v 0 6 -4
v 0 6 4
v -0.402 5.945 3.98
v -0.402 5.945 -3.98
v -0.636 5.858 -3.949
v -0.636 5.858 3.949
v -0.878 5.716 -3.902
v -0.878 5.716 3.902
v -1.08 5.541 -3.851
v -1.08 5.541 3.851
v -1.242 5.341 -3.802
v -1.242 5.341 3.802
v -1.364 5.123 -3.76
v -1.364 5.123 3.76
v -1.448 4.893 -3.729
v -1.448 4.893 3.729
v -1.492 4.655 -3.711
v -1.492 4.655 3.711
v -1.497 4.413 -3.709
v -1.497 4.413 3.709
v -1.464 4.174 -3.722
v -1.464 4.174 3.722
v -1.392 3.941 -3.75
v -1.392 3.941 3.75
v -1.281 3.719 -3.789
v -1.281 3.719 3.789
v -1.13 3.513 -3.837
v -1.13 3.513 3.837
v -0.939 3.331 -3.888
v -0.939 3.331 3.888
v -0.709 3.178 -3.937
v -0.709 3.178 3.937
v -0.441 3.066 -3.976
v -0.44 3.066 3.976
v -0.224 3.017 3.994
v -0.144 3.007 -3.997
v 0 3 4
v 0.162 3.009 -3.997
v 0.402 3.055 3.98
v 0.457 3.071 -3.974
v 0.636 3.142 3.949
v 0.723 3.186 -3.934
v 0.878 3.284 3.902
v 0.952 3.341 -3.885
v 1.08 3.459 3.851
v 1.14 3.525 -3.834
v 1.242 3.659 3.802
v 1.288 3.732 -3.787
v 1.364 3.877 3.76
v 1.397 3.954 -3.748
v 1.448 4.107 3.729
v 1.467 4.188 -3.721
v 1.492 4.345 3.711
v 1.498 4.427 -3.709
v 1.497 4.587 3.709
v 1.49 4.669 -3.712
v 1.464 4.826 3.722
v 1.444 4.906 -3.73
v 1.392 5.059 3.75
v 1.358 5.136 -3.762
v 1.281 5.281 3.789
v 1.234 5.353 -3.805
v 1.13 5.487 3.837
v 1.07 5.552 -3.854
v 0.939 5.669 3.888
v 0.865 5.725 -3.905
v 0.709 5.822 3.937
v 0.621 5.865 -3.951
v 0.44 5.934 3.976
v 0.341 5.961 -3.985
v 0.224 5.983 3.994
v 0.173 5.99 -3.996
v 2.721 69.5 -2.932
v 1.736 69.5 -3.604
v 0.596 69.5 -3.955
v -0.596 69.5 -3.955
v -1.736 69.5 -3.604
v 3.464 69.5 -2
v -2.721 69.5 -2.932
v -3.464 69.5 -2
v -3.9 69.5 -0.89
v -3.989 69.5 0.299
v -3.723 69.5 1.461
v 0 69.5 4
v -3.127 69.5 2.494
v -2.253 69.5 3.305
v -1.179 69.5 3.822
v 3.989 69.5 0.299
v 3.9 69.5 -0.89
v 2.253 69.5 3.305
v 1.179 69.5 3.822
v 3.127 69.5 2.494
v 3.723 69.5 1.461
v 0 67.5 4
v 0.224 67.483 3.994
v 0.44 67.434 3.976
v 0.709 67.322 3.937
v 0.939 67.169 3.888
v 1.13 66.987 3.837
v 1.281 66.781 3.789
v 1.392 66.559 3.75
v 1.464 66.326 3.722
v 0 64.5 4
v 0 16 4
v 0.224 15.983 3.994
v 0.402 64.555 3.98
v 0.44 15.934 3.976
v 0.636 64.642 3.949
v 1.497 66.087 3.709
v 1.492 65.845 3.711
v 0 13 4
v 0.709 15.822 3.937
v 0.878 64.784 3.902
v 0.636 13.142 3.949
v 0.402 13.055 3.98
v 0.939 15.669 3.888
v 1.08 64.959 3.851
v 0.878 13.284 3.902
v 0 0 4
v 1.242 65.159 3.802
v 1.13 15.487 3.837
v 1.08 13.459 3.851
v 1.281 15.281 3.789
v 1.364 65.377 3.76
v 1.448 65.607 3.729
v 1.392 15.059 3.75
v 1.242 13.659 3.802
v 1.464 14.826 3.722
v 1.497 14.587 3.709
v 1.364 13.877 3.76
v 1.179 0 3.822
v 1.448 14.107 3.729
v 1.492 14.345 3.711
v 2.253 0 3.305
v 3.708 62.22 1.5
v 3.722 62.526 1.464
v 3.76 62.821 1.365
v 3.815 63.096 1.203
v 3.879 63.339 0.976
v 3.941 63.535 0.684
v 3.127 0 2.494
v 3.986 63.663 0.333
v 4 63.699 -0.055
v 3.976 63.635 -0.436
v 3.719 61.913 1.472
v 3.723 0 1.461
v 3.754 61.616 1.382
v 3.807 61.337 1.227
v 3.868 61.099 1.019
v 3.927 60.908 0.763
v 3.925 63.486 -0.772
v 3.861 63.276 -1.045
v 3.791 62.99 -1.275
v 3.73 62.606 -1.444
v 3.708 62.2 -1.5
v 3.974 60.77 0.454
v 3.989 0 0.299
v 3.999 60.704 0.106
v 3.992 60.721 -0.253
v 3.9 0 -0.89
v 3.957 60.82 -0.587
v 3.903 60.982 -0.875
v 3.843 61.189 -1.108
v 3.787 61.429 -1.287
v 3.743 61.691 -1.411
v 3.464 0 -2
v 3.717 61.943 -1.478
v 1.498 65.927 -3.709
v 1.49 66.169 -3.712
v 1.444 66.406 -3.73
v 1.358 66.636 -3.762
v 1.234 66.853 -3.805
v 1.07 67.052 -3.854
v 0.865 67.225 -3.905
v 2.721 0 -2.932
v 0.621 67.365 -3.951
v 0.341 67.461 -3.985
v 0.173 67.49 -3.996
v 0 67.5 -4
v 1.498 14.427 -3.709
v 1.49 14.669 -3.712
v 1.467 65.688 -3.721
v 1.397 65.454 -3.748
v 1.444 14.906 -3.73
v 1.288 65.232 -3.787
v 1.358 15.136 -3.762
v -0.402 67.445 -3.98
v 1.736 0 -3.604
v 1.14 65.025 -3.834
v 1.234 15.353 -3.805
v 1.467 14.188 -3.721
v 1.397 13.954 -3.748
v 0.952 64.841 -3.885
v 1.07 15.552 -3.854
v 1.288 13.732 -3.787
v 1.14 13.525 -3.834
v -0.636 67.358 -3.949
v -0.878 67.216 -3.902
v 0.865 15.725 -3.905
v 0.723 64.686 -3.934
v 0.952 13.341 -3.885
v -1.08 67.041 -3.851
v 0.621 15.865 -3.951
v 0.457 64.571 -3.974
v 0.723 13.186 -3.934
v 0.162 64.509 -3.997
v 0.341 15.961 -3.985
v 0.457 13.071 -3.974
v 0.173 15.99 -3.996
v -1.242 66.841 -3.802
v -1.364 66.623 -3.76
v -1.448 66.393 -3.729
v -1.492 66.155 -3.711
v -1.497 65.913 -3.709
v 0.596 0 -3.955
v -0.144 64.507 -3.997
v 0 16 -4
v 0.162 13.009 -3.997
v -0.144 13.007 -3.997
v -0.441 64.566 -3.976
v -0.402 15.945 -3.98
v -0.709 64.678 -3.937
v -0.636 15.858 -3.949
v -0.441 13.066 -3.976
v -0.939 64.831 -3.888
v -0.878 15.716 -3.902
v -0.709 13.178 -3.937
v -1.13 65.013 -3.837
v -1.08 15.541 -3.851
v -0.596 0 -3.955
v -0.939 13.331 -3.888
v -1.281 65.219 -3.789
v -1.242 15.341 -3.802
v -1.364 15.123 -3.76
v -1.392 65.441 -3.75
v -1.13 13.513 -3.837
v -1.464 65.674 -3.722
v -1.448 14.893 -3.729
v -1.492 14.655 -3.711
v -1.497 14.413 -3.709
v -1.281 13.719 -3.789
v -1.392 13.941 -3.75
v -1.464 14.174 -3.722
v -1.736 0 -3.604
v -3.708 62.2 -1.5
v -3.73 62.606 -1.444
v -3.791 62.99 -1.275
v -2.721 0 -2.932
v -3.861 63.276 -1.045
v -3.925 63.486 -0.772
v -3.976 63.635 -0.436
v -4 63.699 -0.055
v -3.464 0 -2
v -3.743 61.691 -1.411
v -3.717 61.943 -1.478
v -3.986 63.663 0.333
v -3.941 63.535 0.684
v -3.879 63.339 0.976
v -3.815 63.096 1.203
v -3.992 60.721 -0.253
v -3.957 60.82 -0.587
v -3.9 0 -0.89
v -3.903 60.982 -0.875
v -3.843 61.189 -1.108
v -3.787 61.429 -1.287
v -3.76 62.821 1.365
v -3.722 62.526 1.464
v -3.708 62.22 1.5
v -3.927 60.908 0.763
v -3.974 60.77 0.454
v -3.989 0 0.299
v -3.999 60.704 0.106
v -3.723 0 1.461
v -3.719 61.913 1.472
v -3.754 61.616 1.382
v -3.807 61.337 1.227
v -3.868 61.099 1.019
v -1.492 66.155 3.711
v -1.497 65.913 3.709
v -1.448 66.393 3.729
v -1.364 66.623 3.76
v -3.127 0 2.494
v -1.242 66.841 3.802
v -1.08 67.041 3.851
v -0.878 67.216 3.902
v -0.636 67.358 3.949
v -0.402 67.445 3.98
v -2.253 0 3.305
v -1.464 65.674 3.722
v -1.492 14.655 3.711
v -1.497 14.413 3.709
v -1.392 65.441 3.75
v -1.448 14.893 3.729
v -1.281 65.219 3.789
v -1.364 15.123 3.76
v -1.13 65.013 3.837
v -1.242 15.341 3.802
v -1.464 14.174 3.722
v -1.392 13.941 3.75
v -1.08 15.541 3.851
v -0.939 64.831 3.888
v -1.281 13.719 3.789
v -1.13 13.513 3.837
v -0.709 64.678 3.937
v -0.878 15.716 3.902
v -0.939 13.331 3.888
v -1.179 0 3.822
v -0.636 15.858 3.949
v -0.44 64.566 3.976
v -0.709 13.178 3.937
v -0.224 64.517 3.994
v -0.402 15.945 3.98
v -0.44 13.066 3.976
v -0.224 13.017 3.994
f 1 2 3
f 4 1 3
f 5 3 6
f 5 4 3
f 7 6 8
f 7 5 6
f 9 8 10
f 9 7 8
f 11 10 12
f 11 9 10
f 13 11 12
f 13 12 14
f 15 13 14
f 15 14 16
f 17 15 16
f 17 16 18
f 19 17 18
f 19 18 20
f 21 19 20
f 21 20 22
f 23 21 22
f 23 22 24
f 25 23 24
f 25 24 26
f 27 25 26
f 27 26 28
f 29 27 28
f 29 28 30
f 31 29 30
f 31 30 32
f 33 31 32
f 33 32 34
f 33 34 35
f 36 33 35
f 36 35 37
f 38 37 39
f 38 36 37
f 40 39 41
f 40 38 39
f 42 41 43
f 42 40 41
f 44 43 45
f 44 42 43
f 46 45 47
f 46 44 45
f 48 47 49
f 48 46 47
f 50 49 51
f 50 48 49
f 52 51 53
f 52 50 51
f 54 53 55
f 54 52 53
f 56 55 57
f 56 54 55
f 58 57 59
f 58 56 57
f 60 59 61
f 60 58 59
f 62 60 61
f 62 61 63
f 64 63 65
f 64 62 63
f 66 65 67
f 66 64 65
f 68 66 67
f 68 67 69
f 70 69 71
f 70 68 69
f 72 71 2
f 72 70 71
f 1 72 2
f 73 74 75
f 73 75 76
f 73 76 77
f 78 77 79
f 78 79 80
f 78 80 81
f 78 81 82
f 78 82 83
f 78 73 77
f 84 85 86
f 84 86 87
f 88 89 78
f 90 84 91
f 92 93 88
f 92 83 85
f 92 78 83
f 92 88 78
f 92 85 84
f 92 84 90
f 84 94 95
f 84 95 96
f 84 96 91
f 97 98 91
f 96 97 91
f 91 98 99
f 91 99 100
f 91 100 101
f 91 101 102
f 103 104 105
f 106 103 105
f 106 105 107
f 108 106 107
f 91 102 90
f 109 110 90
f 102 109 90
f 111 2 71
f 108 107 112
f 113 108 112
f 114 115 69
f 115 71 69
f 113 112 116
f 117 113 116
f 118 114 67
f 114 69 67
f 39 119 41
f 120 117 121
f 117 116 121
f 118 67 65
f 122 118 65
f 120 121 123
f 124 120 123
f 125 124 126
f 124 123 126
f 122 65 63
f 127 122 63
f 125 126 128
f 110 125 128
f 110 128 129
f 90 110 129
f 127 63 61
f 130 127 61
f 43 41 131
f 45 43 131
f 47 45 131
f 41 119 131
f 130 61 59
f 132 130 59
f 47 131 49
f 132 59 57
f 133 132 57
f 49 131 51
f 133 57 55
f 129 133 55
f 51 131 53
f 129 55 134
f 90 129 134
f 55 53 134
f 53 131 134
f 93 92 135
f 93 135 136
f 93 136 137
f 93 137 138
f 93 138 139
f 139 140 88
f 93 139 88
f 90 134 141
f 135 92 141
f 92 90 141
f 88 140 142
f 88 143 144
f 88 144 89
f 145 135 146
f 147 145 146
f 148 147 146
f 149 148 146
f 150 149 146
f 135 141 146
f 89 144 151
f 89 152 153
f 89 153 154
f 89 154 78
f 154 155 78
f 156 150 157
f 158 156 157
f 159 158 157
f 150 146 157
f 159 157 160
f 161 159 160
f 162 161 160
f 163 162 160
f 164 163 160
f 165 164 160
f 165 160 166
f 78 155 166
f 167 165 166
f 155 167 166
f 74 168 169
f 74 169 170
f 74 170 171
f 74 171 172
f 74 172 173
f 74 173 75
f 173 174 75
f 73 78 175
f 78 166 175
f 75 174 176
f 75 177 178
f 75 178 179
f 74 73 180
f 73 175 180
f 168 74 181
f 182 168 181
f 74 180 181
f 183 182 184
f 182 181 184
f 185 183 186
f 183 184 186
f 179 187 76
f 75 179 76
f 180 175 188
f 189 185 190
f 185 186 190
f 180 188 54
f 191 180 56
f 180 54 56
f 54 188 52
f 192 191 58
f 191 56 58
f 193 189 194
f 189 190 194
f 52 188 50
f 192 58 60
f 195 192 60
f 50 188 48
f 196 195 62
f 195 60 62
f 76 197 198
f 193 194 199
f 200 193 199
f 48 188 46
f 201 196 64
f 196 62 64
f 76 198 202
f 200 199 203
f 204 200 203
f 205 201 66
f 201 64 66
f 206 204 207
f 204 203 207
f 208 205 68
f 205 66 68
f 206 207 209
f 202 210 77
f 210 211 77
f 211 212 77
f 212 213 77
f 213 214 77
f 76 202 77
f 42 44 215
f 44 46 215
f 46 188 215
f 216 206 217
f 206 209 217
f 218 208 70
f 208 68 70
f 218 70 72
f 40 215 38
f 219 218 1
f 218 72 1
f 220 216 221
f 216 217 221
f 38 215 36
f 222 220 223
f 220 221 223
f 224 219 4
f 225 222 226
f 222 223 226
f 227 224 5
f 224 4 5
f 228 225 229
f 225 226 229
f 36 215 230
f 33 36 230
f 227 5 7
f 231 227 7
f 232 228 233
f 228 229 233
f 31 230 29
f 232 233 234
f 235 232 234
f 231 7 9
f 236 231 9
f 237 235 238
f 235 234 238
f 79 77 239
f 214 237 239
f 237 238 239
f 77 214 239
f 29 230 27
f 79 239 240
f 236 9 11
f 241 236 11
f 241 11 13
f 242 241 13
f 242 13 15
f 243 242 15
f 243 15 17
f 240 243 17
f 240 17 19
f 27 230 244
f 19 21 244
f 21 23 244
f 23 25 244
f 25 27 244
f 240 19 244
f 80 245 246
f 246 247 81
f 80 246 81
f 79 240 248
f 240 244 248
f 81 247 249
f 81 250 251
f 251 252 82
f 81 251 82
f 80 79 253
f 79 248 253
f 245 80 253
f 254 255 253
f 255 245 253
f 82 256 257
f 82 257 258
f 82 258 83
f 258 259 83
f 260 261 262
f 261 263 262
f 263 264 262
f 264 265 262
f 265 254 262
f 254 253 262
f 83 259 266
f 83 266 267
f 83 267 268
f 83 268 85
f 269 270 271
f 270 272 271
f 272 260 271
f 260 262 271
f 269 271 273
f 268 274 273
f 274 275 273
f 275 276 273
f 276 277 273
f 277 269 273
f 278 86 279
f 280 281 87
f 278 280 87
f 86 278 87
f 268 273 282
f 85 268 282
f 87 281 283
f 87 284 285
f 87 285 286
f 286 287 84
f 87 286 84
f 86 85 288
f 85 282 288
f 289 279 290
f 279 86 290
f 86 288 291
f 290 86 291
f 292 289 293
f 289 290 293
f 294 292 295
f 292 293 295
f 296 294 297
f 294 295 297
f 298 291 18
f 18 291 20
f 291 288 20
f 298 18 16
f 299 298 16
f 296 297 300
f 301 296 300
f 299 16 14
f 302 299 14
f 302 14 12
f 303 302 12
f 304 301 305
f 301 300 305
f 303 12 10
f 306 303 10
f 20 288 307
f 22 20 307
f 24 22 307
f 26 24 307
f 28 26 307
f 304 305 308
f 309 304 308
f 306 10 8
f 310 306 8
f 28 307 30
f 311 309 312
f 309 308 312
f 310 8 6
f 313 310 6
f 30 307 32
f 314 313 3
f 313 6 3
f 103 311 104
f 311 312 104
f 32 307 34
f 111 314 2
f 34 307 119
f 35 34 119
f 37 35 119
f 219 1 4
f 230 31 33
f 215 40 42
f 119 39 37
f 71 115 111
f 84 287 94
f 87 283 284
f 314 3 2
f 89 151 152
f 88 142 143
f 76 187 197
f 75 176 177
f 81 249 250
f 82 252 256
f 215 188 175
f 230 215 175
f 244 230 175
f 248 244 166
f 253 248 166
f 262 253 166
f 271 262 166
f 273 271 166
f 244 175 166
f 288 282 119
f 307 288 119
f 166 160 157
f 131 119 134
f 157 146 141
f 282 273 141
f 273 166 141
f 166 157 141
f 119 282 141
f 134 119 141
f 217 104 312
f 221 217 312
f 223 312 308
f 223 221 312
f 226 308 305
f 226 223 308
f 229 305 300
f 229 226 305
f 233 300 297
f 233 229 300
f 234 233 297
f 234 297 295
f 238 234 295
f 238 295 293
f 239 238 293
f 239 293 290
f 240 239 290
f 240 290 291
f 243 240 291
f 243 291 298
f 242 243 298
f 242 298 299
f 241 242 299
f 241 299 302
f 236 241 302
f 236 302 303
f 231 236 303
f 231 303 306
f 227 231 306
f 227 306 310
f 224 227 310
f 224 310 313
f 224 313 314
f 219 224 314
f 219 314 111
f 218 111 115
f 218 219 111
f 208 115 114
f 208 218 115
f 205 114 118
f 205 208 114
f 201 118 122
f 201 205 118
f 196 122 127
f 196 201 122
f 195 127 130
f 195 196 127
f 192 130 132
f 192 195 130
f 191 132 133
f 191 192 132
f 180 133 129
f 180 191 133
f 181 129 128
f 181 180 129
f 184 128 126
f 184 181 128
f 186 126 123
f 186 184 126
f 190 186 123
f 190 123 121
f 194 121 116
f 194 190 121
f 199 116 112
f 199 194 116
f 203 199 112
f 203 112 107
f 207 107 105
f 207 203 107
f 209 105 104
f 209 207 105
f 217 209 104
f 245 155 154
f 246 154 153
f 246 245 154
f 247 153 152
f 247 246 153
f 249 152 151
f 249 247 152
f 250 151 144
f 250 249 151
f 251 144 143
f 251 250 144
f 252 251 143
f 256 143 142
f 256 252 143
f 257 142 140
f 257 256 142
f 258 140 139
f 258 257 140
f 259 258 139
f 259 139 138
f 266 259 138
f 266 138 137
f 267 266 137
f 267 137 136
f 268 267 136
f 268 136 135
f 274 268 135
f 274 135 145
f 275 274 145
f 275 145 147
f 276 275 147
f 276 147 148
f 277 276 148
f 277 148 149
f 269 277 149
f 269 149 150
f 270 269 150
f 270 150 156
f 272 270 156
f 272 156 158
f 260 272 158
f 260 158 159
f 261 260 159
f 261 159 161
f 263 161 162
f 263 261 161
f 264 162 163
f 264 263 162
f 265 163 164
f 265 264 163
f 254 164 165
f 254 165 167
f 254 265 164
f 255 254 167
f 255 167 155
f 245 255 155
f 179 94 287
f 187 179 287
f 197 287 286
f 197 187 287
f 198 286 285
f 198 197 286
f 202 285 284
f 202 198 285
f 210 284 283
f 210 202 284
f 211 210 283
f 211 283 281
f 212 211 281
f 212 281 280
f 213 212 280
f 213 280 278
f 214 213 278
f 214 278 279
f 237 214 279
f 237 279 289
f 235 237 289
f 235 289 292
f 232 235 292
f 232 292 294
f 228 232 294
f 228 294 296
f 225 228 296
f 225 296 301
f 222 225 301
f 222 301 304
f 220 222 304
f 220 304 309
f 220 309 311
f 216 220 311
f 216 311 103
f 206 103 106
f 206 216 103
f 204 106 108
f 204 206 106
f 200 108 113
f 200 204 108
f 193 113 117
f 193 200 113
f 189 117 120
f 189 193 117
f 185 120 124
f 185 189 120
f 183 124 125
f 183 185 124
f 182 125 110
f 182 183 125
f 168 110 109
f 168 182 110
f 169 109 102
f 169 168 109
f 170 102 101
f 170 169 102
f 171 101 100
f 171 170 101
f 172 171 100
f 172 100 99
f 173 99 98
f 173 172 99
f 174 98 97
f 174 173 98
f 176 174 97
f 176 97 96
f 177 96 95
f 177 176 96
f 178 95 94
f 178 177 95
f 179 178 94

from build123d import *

# Parameters (mm, degrees)
SKETCH1_R               = 4
BOSS_EXTRUDE1_DEPTH     = 69.5
CUT_EXTRUDE1_DEPTH      = 79.218588868
CUT_EXTRUDE1_DEPTH_BACK = 79.218588868
SKETCH2_R               = 1.5
CUT_EXTRUDE2_DEPTH      = 70.729835906
CUT_EXTRUDE2_DEPTH_BACK = 70.729835906
SKETCH3_R               = 1.5
CUT_EXTRUDE3_DEPTH      = 70.729835906
CUT_EXTRUDE3_DEPTH_BACK = 70.729835906
SKETCH4_R               = 1.5


with BuildPart() as part:
    # Sketch1 → Boss-Extrude1 (new body)
    with BuildSketch(Plane(origin=(0, 0, 0), x_dir=(1, 0, 0), z_dir=(0, 1, 0))):
        with Locations(Location((0, 0, 0), (0, 0, 270))):
            Circle(SKETCH1_R)
    extrude(amount=BOSS_EXTRUDE1_DEPTH)

    # Sketch2 → Cut-Extrude1 (cut, two sides: drawn at the far end of the back side and taken through both)
    with BuildSketch(Plane(origin=(-34.800875944, 1.701477372, 0), x_dir=(1, 0, 0), z_dir=(0, 0, 1)).offset(-CUT_EXTRUDE1_DEPTH_BACK)):
        with Locations(Location((34.800875944, 2.798522628, 0), (0, 0, 90.000000025))):
            Circle(SKETCH2_R)
        with Locations(Location((34.800875944, 12.798522628, 0), (0, 0, 90.000000025))):
            Circle(SKETCH2_R)
    extrude(amount=CUT_EXTRUDE1_DEPTH + CUT_EXTRUDE1_DEPTH_BACK, mode=Mode.SUBTRACT)

    # Sketch3 → Cut-Extrude2 (cut, two sides: drawn at the far end of the back side and taken through both)
    with BuildSketch(Plane.XY.offset(-CUT_EXTRUDE2_DEPTH_BACK)):
        with Locations(Location((0, 66, 0), (0, 0, 90.000000025))):
            Circle(SKETCH3_R)
    extrude(amount=CUT_EXTRUDE2_DEPTH + CUT_EXTRUDE2_DEPTH_BACK, mode=Mode.SUBTRACT)

    # Sketch4 → Cut-Extrude3 (cut, two sides: drawn at the far end of the back side and taken through both)
    with BuildSketch(Plane(origin=(0, 0, 0), x_dir=(0, 0, -1), z_dir=(1, 0, 0)).offset(-CUT_EXTRUDE3_DEPTH_BACK)):
        with Locations((0, 62.2)):
            Circle(SKETCH4_R)
    extrude(amount=CUT_EXTRUDE3_DEPTH + CUT_EXTRUDE3_DEPTH_BACK, mode=Mode.SUBTRACT)


solid = part.part
